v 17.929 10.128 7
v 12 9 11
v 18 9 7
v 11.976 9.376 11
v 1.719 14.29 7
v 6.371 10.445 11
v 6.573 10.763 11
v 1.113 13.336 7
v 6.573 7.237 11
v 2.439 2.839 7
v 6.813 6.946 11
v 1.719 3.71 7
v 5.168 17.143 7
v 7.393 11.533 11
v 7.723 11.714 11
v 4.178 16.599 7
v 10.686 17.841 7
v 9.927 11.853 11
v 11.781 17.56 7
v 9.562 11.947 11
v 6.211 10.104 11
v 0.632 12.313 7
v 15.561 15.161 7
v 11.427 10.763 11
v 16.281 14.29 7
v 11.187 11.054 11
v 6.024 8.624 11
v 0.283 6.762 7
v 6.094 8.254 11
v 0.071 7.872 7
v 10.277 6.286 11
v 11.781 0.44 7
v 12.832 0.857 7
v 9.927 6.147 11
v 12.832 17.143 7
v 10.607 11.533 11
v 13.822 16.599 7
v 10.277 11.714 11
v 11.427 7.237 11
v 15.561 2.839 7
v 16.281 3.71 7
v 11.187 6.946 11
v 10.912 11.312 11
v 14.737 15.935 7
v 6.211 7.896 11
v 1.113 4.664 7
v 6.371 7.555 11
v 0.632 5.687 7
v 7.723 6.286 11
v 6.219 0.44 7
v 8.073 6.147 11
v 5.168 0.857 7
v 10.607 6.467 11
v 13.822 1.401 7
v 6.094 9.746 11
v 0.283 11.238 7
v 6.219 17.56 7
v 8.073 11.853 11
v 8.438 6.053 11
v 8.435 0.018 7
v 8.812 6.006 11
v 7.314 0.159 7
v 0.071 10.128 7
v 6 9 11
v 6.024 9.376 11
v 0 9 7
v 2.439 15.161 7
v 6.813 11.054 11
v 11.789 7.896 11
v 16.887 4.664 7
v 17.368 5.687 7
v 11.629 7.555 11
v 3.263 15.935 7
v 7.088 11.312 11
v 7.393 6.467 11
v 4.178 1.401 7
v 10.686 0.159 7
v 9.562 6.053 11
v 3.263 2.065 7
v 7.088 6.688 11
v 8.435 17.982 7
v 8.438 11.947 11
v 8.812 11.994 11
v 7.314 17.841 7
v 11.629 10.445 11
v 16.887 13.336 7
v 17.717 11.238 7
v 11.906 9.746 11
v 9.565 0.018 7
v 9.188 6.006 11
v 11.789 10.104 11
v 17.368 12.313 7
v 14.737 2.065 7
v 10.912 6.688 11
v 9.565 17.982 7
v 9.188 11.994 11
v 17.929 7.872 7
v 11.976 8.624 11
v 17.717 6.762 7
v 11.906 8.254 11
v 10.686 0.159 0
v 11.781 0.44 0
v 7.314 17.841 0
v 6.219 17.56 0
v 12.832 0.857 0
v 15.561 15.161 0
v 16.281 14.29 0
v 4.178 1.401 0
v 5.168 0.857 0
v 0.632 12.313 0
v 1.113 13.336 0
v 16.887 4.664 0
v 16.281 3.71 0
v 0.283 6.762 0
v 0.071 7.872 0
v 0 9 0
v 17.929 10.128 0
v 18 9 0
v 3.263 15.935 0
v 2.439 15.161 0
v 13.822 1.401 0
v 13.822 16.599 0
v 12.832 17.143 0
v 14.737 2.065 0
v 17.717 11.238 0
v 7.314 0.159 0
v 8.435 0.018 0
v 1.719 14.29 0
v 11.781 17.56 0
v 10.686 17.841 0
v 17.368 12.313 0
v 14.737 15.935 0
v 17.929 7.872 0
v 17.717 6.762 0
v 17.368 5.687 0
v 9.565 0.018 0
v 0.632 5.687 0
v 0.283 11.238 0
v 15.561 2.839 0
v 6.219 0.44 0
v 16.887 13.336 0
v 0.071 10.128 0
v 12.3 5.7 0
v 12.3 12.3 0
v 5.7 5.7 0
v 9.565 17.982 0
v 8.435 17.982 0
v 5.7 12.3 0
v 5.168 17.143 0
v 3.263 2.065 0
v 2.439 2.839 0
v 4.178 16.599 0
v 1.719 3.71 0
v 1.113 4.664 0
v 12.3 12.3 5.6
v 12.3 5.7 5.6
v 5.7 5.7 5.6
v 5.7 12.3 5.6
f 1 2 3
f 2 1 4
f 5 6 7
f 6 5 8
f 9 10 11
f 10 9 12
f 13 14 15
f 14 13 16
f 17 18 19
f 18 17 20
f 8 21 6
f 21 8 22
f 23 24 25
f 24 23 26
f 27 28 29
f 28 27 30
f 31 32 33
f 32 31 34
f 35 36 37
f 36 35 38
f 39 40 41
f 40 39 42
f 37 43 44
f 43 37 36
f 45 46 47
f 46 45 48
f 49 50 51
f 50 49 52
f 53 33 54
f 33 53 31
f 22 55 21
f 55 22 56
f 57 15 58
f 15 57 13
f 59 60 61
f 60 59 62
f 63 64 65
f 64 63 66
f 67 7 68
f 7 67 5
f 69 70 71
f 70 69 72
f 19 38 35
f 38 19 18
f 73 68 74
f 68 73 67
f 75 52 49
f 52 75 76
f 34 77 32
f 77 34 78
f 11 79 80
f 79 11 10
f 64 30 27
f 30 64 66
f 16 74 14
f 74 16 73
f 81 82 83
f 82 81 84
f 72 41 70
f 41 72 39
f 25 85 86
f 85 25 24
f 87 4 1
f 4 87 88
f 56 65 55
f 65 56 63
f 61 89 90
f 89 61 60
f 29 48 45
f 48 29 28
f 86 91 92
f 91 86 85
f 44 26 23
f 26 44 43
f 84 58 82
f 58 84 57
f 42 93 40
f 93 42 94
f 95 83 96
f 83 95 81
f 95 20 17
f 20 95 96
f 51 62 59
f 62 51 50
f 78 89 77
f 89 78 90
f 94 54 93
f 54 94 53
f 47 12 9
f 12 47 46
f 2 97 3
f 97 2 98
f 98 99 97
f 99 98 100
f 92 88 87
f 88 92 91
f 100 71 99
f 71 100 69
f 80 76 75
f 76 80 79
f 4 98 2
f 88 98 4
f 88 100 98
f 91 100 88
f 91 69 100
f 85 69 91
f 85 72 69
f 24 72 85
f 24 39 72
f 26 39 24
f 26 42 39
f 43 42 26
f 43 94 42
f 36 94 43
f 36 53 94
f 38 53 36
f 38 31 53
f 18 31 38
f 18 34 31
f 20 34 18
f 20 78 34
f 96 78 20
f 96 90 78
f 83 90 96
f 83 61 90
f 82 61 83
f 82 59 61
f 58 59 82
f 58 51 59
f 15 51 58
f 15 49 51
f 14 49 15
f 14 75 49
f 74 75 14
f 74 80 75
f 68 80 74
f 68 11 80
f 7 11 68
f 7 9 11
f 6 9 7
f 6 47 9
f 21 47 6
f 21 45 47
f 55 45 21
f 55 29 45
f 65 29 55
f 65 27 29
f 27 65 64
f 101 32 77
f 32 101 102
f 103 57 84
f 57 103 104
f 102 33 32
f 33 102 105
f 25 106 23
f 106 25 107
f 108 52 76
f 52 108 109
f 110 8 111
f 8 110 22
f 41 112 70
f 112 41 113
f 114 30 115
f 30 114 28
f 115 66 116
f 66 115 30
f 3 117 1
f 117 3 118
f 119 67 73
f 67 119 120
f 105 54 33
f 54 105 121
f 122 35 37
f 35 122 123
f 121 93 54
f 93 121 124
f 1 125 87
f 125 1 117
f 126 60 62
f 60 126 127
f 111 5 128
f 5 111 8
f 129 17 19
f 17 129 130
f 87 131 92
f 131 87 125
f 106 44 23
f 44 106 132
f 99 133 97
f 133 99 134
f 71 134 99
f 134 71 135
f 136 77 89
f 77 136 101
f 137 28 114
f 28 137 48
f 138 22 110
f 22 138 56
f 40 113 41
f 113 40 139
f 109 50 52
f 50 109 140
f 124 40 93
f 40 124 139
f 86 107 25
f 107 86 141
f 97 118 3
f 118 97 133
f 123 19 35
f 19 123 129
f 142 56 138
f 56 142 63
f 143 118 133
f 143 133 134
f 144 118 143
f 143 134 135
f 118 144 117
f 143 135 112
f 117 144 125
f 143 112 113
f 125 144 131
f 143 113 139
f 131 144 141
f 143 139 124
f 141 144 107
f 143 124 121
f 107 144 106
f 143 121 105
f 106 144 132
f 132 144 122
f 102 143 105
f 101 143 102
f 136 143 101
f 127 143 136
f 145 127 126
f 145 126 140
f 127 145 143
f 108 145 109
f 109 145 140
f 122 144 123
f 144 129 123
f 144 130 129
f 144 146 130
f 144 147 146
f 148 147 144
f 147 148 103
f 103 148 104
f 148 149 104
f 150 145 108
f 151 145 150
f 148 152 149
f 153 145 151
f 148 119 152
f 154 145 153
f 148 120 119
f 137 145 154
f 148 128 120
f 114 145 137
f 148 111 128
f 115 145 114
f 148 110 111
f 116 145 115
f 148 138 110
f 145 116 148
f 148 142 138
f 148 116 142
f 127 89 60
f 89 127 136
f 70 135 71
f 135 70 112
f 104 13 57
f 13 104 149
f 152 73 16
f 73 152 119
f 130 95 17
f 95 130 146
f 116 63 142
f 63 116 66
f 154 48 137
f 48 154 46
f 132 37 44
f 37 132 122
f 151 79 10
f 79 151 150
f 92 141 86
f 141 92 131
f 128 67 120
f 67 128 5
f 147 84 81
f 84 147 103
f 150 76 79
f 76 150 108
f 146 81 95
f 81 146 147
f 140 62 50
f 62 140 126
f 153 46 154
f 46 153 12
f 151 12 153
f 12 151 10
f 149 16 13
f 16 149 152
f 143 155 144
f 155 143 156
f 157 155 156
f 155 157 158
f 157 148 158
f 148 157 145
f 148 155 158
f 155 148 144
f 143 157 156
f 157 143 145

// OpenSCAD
translate([9, 9, 0]) {
  difference() {
    union() {
      cylinder(h = 7, r = 9);
      translate([0, 0, 7]) {
        intersection() {
          cylinder(h = 6, r1 = 9, r2 = 0);
          cylinder(h = 4, r = 9);
        }
      }
    }
    translate([-3.3, -3.3, -0.2]) {
      cube([6.6, 6.6, 5.8]);
    }
  }
}
$fn = 50;
